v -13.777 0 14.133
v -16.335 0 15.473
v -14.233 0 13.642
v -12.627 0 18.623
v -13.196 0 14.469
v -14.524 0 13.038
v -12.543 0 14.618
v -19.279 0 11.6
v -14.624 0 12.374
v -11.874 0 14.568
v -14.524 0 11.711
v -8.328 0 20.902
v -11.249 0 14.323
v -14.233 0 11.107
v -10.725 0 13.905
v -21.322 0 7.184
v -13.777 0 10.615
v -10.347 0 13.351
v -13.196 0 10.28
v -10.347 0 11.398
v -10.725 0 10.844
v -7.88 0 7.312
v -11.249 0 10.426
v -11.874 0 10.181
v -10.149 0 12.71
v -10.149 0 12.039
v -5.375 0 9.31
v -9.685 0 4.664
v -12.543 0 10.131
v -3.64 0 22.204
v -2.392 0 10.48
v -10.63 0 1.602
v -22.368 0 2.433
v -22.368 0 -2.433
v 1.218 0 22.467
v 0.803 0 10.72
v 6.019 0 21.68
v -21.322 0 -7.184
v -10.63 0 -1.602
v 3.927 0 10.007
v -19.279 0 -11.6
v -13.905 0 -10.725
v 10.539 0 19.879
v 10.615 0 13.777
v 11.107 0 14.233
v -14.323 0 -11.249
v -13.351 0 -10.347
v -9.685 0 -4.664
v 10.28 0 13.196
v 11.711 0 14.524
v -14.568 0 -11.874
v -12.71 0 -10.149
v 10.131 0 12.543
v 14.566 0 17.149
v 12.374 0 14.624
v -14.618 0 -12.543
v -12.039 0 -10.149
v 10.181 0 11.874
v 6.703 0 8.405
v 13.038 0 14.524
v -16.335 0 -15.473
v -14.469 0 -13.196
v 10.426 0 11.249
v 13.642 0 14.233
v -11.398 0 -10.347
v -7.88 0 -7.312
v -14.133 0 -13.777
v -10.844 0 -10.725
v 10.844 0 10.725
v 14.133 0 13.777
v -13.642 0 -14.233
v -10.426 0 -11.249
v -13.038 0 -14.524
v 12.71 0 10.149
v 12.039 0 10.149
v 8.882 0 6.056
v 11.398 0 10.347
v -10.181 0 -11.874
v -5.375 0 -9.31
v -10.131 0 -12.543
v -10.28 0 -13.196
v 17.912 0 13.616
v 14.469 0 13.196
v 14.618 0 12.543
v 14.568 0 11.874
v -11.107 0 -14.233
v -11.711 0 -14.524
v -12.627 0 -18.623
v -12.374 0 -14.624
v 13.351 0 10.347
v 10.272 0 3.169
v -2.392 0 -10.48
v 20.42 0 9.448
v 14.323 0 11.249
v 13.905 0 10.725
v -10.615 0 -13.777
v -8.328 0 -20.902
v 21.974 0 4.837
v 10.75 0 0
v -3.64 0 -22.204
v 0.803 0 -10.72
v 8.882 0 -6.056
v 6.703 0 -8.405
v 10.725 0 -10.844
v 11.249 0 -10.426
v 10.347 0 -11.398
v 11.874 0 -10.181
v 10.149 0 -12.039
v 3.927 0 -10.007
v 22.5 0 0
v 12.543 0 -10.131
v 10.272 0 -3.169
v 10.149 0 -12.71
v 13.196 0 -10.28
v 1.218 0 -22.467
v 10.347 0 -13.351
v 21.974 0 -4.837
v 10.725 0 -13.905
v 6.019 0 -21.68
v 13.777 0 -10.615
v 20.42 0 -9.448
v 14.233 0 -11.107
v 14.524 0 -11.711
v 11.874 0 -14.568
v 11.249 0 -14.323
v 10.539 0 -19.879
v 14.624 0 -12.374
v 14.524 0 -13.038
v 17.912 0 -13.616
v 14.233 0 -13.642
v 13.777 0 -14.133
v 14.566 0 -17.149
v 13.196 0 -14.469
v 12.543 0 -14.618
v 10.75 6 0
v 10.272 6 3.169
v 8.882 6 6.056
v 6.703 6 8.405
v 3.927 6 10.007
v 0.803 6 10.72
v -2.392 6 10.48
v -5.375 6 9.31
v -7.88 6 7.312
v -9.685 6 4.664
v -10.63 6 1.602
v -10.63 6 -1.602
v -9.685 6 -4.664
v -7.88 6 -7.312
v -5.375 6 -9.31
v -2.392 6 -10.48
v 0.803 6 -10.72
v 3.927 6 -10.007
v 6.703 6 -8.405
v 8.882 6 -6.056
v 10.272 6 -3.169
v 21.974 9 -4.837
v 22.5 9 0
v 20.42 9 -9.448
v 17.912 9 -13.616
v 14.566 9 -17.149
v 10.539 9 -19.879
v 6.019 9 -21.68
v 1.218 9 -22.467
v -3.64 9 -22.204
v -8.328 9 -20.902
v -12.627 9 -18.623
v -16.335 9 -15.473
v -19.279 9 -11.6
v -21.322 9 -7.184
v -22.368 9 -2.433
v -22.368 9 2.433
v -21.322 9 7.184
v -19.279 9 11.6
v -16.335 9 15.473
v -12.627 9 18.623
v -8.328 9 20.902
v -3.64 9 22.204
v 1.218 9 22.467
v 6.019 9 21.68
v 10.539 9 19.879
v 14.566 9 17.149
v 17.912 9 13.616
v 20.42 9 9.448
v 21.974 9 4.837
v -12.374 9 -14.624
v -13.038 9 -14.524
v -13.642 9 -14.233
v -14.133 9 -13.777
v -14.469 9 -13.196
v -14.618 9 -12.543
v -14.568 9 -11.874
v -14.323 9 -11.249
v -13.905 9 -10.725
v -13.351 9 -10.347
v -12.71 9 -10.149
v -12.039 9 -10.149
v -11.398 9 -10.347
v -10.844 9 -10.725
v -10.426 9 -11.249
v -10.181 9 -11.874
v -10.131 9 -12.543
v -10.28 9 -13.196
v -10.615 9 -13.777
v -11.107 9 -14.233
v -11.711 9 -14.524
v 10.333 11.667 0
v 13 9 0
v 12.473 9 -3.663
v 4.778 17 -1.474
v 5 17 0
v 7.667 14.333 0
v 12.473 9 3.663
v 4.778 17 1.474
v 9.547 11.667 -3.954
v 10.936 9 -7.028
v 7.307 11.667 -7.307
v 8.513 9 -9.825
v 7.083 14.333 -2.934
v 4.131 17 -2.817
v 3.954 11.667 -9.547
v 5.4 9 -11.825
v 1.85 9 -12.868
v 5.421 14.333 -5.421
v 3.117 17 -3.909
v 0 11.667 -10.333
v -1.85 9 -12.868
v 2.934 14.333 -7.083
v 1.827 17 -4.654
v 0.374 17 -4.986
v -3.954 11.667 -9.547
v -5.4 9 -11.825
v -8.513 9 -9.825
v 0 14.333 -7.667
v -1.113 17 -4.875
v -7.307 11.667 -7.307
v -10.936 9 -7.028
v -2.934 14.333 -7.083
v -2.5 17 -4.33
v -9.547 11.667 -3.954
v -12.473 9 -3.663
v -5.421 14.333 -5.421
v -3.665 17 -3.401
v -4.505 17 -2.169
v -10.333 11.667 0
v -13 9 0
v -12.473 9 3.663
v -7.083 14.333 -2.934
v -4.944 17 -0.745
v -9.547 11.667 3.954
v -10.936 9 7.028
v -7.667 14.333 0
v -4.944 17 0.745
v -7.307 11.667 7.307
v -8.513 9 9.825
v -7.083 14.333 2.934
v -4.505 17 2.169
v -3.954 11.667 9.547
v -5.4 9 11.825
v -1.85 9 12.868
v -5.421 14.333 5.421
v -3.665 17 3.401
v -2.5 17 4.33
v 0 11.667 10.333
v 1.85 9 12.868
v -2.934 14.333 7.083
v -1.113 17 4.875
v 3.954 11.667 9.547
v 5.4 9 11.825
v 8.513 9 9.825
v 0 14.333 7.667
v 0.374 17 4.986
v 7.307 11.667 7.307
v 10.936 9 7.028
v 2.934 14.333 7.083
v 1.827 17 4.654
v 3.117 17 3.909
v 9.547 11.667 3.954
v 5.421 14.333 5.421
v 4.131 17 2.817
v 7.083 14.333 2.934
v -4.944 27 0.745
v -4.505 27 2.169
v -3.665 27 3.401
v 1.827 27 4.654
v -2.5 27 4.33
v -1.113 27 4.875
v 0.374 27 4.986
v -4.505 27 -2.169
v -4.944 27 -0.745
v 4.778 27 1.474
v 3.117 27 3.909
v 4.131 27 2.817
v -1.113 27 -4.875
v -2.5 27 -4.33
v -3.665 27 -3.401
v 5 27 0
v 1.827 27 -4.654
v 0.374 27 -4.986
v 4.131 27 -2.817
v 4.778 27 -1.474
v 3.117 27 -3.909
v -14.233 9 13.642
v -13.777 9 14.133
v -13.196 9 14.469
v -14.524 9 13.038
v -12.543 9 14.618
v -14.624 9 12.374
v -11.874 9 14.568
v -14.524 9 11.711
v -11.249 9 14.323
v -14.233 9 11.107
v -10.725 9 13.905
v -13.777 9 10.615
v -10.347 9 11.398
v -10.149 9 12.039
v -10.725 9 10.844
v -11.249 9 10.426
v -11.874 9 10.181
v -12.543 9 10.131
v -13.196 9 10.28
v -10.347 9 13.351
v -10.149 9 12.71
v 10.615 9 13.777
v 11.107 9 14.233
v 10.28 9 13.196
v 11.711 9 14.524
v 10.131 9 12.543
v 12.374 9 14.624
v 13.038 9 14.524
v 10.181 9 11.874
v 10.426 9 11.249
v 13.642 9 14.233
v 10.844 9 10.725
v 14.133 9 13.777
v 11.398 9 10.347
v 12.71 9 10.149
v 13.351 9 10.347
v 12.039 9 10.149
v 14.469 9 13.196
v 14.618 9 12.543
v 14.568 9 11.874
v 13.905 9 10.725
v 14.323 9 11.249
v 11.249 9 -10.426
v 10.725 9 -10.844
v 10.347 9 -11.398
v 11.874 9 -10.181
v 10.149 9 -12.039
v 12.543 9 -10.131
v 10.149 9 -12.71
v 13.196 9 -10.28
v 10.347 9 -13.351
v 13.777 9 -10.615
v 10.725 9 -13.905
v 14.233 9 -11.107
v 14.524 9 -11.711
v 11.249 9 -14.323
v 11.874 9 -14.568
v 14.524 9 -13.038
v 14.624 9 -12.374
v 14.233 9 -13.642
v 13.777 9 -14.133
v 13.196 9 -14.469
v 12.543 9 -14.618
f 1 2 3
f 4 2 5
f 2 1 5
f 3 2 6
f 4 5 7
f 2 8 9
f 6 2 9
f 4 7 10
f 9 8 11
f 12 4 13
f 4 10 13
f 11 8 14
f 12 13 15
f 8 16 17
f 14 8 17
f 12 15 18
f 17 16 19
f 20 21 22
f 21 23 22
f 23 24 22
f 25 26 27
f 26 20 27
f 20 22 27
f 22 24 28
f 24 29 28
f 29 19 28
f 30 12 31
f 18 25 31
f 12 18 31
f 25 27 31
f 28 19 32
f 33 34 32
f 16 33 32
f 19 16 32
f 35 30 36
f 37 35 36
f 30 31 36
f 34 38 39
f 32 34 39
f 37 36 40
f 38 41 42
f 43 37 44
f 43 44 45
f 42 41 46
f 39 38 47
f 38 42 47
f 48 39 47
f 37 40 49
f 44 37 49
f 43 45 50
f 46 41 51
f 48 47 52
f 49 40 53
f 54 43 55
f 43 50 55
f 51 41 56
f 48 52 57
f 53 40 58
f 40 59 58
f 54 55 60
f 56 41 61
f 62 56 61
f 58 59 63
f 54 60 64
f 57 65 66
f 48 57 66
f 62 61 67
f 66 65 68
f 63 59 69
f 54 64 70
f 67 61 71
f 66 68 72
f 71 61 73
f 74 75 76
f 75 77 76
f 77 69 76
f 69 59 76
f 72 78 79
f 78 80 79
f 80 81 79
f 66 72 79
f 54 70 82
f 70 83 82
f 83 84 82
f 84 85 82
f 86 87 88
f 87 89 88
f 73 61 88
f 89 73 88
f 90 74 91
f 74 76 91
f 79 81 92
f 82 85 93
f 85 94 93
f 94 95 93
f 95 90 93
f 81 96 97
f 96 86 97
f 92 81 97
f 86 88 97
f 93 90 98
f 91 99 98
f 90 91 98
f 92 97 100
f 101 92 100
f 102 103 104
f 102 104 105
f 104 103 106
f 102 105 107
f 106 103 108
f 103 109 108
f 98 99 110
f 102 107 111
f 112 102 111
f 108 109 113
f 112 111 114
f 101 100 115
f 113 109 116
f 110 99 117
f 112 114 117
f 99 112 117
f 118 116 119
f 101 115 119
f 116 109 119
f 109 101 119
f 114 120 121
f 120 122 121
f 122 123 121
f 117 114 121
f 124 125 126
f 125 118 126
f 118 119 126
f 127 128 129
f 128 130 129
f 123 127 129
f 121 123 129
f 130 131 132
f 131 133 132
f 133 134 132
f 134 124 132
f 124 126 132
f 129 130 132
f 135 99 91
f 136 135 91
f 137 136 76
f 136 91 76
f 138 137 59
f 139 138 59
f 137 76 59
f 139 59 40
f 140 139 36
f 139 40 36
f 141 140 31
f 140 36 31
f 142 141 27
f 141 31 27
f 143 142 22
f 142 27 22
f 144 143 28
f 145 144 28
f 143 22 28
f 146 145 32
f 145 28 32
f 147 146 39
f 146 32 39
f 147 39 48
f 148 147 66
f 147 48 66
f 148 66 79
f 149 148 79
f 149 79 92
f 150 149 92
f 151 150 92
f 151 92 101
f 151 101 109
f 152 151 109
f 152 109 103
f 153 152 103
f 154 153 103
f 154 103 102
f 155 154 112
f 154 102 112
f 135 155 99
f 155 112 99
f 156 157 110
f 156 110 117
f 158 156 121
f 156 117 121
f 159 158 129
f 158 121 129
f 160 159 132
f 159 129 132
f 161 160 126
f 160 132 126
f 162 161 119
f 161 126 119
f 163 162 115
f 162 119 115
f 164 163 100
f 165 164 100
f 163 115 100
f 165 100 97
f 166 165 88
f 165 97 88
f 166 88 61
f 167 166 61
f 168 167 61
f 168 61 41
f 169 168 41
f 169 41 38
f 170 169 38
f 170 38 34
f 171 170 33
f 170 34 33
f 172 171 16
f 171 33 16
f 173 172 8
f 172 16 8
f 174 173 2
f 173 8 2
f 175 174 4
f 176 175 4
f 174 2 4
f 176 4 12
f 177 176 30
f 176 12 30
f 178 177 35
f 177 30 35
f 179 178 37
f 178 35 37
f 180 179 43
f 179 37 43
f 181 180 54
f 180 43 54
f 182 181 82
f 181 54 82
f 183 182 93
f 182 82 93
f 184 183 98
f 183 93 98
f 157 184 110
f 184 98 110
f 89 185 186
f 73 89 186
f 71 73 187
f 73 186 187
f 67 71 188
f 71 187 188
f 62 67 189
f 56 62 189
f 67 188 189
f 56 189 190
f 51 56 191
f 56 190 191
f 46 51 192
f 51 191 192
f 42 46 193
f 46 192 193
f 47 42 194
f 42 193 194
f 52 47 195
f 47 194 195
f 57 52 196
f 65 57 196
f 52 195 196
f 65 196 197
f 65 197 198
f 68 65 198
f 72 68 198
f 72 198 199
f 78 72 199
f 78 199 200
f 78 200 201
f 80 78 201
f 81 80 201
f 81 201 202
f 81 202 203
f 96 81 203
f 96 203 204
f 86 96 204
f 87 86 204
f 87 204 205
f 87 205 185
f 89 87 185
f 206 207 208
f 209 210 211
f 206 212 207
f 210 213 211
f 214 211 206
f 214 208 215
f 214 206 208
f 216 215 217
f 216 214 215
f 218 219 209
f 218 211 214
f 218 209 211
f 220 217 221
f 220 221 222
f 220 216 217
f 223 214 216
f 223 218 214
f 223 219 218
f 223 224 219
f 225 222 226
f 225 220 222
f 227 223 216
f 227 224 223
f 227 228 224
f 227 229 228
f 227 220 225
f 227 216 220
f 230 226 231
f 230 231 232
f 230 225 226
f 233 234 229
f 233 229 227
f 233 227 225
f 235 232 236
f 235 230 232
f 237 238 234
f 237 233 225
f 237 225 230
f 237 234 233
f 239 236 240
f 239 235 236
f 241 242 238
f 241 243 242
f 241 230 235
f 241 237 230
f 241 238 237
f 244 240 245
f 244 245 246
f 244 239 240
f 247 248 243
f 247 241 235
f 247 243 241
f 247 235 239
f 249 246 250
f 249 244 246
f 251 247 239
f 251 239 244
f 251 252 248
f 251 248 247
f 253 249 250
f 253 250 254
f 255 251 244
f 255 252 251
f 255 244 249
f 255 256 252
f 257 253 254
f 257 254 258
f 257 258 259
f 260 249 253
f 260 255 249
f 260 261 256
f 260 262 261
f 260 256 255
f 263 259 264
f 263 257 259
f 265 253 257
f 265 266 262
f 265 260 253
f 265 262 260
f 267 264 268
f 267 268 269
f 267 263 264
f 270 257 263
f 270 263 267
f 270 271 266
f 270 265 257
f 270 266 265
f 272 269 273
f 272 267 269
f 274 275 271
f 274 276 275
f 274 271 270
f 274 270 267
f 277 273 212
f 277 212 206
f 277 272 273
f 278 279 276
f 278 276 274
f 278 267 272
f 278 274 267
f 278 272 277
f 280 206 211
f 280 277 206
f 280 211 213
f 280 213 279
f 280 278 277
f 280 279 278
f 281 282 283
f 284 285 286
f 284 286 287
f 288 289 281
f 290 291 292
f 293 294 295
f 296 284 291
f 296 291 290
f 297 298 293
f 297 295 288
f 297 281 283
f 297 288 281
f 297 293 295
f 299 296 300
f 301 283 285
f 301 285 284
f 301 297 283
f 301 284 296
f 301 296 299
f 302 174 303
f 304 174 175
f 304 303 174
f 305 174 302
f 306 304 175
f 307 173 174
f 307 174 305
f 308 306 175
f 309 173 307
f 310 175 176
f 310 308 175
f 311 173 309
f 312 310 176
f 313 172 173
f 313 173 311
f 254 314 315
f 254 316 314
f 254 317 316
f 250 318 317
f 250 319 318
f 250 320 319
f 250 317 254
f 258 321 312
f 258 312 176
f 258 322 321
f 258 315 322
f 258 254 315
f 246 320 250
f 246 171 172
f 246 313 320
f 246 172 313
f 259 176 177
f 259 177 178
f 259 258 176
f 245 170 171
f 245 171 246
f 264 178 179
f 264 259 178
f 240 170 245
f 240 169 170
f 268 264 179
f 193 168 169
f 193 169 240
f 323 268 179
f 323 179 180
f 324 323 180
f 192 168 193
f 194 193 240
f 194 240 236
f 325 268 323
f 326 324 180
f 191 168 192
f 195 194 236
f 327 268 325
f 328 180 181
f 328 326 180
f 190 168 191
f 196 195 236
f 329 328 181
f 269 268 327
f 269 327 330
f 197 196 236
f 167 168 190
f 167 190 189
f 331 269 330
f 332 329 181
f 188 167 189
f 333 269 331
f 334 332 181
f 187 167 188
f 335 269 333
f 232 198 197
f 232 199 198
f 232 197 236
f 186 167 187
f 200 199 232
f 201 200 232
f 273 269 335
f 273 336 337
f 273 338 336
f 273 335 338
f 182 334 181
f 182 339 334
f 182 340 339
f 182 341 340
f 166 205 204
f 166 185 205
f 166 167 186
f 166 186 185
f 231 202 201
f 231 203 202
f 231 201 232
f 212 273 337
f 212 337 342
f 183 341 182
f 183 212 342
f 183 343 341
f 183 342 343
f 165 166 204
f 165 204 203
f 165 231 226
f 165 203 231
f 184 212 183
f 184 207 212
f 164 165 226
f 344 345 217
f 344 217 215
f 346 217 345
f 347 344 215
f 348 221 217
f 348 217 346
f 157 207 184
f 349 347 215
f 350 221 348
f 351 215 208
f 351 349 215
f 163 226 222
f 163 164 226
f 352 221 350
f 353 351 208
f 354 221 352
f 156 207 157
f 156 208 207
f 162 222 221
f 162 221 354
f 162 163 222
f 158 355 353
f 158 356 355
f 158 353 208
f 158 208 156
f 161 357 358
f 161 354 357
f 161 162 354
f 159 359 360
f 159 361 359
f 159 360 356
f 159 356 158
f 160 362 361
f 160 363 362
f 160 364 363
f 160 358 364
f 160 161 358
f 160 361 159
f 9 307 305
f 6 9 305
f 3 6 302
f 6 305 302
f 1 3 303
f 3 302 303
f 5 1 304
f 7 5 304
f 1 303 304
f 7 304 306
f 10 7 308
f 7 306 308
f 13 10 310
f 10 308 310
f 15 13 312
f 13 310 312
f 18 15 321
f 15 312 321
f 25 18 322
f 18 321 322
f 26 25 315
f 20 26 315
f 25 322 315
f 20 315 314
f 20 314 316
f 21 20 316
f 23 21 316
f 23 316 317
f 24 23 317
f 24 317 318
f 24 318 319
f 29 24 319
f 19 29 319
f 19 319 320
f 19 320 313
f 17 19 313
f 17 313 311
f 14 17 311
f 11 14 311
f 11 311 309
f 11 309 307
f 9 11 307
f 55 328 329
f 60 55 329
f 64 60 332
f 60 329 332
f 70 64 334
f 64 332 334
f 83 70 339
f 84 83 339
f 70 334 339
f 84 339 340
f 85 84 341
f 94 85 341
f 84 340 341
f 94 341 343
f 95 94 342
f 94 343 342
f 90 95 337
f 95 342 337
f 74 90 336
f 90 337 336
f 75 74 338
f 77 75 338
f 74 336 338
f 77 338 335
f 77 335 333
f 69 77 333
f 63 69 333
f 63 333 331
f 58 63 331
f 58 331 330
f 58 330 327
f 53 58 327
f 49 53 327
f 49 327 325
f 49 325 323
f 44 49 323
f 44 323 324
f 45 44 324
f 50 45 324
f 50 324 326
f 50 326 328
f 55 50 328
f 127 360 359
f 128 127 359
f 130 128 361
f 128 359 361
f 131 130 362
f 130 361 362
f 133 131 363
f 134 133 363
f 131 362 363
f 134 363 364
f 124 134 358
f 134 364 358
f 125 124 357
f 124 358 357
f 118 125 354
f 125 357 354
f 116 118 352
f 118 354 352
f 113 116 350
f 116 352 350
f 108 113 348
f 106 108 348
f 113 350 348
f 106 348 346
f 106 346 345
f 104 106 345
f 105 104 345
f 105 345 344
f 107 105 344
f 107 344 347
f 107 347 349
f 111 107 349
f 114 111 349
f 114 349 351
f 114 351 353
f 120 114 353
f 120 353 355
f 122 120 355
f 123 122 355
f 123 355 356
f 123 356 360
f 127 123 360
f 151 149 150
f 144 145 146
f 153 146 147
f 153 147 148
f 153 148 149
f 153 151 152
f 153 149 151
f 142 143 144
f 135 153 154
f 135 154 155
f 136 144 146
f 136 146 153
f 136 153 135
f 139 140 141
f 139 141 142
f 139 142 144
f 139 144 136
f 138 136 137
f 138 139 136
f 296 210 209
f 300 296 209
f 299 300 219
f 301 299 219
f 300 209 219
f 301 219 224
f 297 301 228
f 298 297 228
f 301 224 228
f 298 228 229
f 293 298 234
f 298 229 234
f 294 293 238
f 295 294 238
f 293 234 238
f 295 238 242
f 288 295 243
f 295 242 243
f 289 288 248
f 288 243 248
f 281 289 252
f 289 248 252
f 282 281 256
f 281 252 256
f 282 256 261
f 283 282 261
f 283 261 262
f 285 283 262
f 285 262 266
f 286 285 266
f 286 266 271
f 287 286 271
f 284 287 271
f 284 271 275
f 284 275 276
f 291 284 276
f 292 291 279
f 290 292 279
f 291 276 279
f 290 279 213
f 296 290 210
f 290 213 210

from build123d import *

# Parameters (mm, degrees)
SKETCH1_R           = 22.5
BOSS_EXTRUDE1_DEPTH = 9
SKETCH2_R           = 2.25
CUT_EXTRUDE1_DEPTH  = 10
CIRPATTERN1_COUNT   = 4
SKETCH3_R           = 5
BOSS_EXTRUDE2_DEPTH = 18
CHAMFER1_SIZE       = 8
SKETCH6_R           = 10.75
CUT_EXTRUDE4_DEPTH  = 6


with BuildPart() as part:
    # Sketch1 → Boss-Extrude1 (new body)
    with BuildSketch(Plane(origin=(0, 0, 0), x_dir=(1, 0, 0), z_dir=(0, 1, 0))):
        Circle(SKETCH1_R)
    extrude(amount=BOSS_EXTRUDE1_DEPTH)

    # Sketch2 → Cut-Extrude1 (cut, through all)
    with BuildSketch(Plane(origin=(0, 9, 0), x_dir=(1, 0, 0), z_dir=(0, 1, 0))):
        with Locations((12.374368671, 12.374368671)):
            Circle(SKETCH2_R)
    cut_extrude1 = extrude(amount=-CUT_EXTRUDE1_DEPTH, mode=Mode.SUBTRACT)

    # CirPattern1: Cut-Extrude1 ×4 about axis
    cirpattern1_axis = Axis((0, 0, 0), (0, 1, 0))
    for i in range(1, CIRPATTERN1_COUNT):
        add(cut_extrude1.rotate(cirpattern1_axis, i * 360 / CIRPATTERN1_COUNT), mode=Mode.SUBTRACT)

    # Sketch3 → Boss-Extrude2 (add)
    with BuildSketch(Plane(origin=(0, 9, 0), x_dir=(1, 0, 0), z_dir=(0, 1, 0))):
        Circle(SKETCH3_R)
    extrude(amount=BOSS_EXTRUDE2_DEPTH)

    # Chamfer1
    chamfer1_edges = [part.edges().sort_by_distance(p)[0] for p in [
        (-5, 9, 0),
    ]]
    chamfer(chamfer1_edges, length=CHAMFER1_SIZE)

    # Sketch6 → Cut-Extrude4 (cut)
    with BuildSketch(Plane.XZ):
        Circle(SKETCH6_R)
    extrude(amount=-CUT_EXTRUDE4_DEPTH, mode=Mode.SUBTRACT)


solid = part.part
